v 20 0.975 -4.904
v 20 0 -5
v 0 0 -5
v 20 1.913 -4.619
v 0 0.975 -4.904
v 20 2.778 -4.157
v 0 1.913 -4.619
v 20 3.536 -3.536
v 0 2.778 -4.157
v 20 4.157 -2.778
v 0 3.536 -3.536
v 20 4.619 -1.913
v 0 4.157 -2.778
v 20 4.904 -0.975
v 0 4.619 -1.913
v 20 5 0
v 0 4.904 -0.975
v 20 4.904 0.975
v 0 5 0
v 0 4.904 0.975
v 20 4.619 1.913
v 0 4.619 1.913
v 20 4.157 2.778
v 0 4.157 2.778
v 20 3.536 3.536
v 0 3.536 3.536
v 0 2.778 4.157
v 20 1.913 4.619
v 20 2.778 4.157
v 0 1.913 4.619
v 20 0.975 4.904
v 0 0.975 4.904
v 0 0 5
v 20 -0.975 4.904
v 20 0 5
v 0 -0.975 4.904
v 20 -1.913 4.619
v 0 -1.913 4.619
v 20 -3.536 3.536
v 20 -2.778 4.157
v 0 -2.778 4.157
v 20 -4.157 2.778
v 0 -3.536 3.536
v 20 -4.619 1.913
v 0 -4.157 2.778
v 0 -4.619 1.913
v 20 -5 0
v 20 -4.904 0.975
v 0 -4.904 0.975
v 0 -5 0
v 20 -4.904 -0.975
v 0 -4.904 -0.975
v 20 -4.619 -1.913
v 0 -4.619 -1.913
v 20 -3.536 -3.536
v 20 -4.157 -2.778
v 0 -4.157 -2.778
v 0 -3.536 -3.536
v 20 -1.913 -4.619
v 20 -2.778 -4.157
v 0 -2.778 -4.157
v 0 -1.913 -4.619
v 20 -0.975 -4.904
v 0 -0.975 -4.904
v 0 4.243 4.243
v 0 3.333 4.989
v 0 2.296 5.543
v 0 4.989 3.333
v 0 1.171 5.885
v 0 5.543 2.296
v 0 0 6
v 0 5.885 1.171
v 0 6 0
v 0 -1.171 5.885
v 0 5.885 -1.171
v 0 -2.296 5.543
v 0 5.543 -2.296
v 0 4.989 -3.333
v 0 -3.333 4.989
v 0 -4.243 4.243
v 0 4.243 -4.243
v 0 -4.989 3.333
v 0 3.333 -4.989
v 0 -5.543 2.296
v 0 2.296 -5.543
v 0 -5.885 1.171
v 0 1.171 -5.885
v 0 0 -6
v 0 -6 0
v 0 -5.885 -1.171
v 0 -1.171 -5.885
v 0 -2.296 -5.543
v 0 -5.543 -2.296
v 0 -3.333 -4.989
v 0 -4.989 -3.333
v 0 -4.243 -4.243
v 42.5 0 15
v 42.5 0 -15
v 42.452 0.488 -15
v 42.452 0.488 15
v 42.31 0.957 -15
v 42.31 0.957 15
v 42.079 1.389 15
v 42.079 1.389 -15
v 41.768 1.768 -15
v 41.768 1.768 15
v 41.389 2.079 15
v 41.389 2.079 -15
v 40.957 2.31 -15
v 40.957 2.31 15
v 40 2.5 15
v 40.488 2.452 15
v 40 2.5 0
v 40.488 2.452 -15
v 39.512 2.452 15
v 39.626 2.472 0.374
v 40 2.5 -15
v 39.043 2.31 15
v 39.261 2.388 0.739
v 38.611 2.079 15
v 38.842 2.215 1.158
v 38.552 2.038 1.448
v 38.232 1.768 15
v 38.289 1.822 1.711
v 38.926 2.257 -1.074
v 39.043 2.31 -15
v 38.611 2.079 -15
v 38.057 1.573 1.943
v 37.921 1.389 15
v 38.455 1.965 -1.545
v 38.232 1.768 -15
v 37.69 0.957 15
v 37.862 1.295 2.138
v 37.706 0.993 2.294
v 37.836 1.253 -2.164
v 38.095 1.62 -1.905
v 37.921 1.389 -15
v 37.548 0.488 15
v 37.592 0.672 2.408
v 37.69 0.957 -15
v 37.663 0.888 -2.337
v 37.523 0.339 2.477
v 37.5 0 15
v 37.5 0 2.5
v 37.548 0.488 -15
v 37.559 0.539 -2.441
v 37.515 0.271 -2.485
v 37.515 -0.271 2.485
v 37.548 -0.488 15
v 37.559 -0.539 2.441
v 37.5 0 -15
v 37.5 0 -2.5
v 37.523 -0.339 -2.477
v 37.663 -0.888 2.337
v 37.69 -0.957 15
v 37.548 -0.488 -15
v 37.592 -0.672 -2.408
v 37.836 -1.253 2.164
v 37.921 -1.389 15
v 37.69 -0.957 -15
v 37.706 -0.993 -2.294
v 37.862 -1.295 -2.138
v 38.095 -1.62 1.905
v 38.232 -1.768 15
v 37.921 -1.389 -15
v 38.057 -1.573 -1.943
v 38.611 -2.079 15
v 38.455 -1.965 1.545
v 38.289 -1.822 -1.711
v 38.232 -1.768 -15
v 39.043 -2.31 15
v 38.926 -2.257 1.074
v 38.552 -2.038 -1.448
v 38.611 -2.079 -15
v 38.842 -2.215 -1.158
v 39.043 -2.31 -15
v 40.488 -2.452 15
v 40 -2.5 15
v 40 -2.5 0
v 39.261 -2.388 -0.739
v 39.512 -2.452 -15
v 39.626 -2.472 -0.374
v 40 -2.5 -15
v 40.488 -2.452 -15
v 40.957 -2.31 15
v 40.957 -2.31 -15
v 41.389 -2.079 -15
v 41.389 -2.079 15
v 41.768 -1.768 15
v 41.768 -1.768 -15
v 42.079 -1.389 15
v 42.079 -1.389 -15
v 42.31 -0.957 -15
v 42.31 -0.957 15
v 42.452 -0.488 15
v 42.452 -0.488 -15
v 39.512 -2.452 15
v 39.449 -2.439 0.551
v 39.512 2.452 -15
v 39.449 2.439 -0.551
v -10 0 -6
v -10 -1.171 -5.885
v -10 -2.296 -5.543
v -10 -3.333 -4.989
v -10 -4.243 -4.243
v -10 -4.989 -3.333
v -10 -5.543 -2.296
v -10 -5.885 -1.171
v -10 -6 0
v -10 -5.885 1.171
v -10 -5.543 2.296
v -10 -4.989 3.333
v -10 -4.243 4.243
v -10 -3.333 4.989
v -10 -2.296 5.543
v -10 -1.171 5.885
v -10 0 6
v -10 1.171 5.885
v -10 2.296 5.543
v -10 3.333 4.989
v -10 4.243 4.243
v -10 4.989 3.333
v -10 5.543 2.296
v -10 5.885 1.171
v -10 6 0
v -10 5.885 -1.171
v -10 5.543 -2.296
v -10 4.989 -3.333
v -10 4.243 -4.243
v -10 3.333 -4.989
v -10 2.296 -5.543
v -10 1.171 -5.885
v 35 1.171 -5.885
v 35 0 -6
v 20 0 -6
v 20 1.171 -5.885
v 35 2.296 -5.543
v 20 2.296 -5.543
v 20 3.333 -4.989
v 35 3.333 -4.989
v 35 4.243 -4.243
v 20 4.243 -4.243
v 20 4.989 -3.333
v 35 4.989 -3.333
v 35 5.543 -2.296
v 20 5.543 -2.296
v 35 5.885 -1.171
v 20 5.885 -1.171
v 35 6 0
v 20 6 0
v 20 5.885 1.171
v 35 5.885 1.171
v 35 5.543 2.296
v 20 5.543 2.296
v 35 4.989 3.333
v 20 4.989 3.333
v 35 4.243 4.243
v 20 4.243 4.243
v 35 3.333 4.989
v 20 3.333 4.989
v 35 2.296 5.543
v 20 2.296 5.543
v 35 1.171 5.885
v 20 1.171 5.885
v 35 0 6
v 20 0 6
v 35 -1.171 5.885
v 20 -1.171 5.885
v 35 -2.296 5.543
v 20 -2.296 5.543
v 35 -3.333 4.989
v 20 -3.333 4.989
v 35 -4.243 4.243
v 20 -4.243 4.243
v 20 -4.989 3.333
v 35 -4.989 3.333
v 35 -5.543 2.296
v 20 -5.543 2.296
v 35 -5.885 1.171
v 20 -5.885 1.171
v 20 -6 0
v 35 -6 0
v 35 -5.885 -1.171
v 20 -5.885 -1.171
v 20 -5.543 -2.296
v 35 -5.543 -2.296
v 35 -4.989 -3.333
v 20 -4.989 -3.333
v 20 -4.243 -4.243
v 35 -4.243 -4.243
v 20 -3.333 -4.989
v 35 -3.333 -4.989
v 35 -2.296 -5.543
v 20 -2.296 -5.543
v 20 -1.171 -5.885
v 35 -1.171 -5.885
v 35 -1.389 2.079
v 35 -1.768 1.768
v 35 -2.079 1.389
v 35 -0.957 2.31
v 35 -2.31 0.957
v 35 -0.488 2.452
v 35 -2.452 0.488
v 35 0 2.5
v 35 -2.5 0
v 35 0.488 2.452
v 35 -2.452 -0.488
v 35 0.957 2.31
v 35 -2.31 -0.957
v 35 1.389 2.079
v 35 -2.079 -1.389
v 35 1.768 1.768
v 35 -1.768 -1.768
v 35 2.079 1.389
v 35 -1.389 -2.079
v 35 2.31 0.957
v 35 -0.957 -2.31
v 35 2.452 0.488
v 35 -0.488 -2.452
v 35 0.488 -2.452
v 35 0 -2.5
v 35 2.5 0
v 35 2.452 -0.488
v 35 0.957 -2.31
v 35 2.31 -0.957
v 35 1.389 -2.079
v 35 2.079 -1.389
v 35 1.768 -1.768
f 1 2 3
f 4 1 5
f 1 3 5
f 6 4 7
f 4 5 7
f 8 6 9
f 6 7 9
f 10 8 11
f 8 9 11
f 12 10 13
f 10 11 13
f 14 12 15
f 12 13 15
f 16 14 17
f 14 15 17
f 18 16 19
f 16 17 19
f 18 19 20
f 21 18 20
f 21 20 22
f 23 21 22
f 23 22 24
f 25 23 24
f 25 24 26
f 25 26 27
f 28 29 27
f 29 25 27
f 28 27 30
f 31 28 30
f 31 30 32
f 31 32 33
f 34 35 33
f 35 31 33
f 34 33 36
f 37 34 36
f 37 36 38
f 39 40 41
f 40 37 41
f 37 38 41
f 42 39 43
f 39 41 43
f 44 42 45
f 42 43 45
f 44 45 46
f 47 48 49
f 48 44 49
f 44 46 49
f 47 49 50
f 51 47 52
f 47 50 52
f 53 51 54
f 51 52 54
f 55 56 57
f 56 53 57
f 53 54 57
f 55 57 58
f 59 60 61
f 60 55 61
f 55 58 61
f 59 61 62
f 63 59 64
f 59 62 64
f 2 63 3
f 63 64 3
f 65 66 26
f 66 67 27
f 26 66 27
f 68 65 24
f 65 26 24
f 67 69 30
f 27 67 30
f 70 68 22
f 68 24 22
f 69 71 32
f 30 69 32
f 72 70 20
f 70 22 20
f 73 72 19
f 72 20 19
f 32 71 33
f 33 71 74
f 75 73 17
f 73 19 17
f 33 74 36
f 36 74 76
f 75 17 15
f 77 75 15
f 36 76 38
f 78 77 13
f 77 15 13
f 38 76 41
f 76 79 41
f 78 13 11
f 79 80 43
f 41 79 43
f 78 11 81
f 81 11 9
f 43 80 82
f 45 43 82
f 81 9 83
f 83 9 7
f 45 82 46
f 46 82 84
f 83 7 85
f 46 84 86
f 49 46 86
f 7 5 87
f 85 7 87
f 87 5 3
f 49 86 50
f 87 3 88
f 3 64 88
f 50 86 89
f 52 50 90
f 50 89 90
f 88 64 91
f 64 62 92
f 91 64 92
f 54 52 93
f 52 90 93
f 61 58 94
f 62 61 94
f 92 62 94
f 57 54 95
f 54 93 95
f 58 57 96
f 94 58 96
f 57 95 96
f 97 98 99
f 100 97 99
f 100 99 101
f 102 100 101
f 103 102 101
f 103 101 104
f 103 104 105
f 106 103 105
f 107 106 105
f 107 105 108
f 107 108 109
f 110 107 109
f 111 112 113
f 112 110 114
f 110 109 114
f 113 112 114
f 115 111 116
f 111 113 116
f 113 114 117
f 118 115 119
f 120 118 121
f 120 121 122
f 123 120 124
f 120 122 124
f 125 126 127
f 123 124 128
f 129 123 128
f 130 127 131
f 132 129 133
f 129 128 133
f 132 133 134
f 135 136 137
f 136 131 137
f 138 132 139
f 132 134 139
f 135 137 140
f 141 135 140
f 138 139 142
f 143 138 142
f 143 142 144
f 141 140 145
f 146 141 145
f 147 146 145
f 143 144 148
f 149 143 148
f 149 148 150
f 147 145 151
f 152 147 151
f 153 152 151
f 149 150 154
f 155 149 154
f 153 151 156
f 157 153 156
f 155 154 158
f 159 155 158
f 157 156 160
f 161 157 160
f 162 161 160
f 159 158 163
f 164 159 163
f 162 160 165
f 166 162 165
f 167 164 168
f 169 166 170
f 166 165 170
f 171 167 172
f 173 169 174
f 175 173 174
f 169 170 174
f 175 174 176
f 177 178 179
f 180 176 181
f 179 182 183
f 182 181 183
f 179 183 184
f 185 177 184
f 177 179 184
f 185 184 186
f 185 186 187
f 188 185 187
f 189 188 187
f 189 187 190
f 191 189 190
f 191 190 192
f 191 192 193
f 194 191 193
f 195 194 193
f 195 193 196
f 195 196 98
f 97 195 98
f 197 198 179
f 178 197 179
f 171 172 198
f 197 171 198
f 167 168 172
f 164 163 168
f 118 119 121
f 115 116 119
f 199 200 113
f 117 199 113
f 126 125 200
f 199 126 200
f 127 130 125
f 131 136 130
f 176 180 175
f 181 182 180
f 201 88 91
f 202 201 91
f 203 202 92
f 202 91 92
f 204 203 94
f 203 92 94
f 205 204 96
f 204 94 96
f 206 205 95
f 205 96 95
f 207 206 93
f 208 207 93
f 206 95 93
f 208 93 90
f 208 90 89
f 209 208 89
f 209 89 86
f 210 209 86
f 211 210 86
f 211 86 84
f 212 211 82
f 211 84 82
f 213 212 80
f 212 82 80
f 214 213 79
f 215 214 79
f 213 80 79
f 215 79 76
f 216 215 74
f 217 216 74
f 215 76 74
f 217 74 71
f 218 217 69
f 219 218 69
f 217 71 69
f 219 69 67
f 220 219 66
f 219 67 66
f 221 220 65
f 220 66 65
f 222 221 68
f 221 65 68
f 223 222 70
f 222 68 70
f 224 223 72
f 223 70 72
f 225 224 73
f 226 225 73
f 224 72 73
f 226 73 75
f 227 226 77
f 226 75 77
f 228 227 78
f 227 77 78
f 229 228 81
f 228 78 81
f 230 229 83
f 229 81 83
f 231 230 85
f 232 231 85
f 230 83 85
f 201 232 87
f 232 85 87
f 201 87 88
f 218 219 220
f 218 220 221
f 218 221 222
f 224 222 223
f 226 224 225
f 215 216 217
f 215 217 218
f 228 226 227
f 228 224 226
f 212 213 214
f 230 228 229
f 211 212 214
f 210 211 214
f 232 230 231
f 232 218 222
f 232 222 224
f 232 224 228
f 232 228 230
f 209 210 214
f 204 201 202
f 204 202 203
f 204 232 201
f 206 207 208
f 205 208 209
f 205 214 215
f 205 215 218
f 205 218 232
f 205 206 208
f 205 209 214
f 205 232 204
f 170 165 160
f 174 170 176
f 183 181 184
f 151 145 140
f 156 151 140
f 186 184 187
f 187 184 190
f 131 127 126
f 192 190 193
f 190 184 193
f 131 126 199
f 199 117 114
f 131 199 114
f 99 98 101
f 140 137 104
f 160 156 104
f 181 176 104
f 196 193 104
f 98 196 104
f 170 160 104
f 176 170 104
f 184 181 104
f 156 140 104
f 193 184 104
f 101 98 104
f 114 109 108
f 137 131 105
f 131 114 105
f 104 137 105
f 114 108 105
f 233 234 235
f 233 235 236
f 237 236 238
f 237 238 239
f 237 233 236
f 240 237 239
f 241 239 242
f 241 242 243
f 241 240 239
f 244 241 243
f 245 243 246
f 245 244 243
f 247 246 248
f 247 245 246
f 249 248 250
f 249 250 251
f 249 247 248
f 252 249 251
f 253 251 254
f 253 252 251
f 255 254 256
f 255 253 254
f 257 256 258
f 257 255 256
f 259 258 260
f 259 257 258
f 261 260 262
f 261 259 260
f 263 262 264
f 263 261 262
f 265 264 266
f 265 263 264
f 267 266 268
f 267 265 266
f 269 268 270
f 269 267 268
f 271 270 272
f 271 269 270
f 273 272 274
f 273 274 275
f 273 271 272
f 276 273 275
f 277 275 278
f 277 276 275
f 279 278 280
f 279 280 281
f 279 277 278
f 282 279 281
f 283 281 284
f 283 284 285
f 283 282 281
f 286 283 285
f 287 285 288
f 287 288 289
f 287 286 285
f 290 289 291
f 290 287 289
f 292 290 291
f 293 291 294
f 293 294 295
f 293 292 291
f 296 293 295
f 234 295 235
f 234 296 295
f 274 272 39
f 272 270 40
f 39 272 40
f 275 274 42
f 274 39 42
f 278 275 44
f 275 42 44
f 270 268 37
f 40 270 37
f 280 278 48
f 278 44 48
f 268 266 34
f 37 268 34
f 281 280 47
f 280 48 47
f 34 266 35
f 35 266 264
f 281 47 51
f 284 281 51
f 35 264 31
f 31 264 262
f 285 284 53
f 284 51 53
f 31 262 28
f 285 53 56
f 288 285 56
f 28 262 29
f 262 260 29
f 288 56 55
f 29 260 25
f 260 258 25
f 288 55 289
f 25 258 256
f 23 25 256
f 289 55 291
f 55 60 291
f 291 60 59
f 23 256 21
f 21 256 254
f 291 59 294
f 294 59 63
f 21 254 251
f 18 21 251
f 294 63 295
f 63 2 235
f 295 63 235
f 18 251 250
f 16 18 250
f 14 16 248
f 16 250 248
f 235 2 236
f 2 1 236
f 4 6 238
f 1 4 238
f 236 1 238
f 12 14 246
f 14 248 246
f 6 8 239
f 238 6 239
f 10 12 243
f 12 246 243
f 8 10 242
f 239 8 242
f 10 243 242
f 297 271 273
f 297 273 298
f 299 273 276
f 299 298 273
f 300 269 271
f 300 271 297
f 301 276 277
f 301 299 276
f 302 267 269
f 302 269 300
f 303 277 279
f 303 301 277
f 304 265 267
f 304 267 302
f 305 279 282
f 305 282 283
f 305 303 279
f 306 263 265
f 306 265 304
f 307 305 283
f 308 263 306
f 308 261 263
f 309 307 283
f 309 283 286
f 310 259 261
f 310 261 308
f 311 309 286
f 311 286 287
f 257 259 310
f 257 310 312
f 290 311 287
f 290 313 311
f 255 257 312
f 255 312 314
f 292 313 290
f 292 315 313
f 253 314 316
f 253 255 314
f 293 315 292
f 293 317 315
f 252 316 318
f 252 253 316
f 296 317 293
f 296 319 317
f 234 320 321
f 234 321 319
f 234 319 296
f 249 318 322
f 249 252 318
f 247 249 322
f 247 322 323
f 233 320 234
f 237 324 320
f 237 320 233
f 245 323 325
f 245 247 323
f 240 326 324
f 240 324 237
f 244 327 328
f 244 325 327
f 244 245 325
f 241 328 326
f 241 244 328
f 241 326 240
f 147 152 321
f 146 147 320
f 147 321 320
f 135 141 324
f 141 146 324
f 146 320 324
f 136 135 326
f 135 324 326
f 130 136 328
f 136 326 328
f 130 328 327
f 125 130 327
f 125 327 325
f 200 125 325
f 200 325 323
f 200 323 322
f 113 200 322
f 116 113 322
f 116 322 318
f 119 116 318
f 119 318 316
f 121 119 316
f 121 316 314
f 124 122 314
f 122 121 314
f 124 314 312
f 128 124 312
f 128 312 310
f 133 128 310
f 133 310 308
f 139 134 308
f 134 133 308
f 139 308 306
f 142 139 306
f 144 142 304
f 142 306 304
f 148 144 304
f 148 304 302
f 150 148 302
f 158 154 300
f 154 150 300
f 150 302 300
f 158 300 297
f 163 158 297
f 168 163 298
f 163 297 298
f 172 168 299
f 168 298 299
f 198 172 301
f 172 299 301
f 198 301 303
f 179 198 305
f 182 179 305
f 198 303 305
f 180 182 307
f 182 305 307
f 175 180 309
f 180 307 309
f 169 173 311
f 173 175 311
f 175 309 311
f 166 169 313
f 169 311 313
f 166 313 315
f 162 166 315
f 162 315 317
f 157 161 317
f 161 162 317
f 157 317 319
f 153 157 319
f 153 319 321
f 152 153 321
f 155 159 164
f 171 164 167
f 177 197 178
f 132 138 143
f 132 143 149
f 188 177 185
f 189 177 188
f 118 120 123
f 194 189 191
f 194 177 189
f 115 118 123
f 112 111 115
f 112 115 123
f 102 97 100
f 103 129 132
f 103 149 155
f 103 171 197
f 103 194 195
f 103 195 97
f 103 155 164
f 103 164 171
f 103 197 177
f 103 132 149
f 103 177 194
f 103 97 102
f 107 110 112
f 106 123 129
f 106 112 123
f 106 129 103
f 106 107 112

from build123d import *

# Parameters (mm, degrees)
SKETCH1_R                = 5
BOSS_EXTRUDE2_DEPTH      = 35
SKETCH3_R                = 2.5
BOSS_EXTRUDE3_DEPTH      = 5
SKETCH4_R                = 6
BOSS_EXTRUDE4_DEPTH      = 15
BOSS_EXTRUDE5_DEPTH      = 15
BOSS_EXTRUDE5_DEPTH_BACK = 15
SKETCH6_R                = 2.5
SKETCH7_R                = 6
BOSS_EXTRUDE6_DEPTH      = 10


with BuildPart() as part:
    # Sketch1 → Boss-Extrude2 (new body)
    with BuildSketch(Plane(origin=(0, 0, 0), x_dir=(0, 0, -1), z_dir=(1, 0, 0))):
        Circle(SKETCH1_R)
    extrude(amount=BOSS_EXTRUDE2_DEPTH)

    # Sketch3 → Boss-Extrude3 (add)
    with BuildSketch(Plane(origin=(35, 0, 0), x_dir=(0, 0, -1), z_dir=(1, 0, 0))):
        Circle(SKETCH3_R)
    extrude(amount=BOSS_EXTRUDE3_DEPTH)

    # Sketch4 → Boss-Extrude4 (add)
    with BuildSketch(Plane(origin=(35, 0, 0), x_dir=(0, 0, -1), z_dir=(1, 0, 0))):
        Circle(SKETCH4_R)
    extrude(amount=-BOSS_EXTRUDE4_DEPTH)

    # Sketch6 → Boss-Extrude5 (add, two sides: drawn at the far end of the back side and taken through both)
    with BuildSketch(Plane.XY.offset(-BOSS_EXTRUDE5_DEPTH_BACK)):
        with Locations((40, 0)):
            Circle(SKETCH6_R)
    extrude(amount=BOSS_EXTRUDE5_DEPTH + BOSS_EXTRUDE5_DEPTH_BACK)

    # Sketch7 → Boss-Extrude6 (add)
    with BuildSketch(Plane.ZY):
        Circle(SKETCH7_R)
    extrude(amount=BOSS_EXTRUDE6_DEPTH)


solid = part.part
